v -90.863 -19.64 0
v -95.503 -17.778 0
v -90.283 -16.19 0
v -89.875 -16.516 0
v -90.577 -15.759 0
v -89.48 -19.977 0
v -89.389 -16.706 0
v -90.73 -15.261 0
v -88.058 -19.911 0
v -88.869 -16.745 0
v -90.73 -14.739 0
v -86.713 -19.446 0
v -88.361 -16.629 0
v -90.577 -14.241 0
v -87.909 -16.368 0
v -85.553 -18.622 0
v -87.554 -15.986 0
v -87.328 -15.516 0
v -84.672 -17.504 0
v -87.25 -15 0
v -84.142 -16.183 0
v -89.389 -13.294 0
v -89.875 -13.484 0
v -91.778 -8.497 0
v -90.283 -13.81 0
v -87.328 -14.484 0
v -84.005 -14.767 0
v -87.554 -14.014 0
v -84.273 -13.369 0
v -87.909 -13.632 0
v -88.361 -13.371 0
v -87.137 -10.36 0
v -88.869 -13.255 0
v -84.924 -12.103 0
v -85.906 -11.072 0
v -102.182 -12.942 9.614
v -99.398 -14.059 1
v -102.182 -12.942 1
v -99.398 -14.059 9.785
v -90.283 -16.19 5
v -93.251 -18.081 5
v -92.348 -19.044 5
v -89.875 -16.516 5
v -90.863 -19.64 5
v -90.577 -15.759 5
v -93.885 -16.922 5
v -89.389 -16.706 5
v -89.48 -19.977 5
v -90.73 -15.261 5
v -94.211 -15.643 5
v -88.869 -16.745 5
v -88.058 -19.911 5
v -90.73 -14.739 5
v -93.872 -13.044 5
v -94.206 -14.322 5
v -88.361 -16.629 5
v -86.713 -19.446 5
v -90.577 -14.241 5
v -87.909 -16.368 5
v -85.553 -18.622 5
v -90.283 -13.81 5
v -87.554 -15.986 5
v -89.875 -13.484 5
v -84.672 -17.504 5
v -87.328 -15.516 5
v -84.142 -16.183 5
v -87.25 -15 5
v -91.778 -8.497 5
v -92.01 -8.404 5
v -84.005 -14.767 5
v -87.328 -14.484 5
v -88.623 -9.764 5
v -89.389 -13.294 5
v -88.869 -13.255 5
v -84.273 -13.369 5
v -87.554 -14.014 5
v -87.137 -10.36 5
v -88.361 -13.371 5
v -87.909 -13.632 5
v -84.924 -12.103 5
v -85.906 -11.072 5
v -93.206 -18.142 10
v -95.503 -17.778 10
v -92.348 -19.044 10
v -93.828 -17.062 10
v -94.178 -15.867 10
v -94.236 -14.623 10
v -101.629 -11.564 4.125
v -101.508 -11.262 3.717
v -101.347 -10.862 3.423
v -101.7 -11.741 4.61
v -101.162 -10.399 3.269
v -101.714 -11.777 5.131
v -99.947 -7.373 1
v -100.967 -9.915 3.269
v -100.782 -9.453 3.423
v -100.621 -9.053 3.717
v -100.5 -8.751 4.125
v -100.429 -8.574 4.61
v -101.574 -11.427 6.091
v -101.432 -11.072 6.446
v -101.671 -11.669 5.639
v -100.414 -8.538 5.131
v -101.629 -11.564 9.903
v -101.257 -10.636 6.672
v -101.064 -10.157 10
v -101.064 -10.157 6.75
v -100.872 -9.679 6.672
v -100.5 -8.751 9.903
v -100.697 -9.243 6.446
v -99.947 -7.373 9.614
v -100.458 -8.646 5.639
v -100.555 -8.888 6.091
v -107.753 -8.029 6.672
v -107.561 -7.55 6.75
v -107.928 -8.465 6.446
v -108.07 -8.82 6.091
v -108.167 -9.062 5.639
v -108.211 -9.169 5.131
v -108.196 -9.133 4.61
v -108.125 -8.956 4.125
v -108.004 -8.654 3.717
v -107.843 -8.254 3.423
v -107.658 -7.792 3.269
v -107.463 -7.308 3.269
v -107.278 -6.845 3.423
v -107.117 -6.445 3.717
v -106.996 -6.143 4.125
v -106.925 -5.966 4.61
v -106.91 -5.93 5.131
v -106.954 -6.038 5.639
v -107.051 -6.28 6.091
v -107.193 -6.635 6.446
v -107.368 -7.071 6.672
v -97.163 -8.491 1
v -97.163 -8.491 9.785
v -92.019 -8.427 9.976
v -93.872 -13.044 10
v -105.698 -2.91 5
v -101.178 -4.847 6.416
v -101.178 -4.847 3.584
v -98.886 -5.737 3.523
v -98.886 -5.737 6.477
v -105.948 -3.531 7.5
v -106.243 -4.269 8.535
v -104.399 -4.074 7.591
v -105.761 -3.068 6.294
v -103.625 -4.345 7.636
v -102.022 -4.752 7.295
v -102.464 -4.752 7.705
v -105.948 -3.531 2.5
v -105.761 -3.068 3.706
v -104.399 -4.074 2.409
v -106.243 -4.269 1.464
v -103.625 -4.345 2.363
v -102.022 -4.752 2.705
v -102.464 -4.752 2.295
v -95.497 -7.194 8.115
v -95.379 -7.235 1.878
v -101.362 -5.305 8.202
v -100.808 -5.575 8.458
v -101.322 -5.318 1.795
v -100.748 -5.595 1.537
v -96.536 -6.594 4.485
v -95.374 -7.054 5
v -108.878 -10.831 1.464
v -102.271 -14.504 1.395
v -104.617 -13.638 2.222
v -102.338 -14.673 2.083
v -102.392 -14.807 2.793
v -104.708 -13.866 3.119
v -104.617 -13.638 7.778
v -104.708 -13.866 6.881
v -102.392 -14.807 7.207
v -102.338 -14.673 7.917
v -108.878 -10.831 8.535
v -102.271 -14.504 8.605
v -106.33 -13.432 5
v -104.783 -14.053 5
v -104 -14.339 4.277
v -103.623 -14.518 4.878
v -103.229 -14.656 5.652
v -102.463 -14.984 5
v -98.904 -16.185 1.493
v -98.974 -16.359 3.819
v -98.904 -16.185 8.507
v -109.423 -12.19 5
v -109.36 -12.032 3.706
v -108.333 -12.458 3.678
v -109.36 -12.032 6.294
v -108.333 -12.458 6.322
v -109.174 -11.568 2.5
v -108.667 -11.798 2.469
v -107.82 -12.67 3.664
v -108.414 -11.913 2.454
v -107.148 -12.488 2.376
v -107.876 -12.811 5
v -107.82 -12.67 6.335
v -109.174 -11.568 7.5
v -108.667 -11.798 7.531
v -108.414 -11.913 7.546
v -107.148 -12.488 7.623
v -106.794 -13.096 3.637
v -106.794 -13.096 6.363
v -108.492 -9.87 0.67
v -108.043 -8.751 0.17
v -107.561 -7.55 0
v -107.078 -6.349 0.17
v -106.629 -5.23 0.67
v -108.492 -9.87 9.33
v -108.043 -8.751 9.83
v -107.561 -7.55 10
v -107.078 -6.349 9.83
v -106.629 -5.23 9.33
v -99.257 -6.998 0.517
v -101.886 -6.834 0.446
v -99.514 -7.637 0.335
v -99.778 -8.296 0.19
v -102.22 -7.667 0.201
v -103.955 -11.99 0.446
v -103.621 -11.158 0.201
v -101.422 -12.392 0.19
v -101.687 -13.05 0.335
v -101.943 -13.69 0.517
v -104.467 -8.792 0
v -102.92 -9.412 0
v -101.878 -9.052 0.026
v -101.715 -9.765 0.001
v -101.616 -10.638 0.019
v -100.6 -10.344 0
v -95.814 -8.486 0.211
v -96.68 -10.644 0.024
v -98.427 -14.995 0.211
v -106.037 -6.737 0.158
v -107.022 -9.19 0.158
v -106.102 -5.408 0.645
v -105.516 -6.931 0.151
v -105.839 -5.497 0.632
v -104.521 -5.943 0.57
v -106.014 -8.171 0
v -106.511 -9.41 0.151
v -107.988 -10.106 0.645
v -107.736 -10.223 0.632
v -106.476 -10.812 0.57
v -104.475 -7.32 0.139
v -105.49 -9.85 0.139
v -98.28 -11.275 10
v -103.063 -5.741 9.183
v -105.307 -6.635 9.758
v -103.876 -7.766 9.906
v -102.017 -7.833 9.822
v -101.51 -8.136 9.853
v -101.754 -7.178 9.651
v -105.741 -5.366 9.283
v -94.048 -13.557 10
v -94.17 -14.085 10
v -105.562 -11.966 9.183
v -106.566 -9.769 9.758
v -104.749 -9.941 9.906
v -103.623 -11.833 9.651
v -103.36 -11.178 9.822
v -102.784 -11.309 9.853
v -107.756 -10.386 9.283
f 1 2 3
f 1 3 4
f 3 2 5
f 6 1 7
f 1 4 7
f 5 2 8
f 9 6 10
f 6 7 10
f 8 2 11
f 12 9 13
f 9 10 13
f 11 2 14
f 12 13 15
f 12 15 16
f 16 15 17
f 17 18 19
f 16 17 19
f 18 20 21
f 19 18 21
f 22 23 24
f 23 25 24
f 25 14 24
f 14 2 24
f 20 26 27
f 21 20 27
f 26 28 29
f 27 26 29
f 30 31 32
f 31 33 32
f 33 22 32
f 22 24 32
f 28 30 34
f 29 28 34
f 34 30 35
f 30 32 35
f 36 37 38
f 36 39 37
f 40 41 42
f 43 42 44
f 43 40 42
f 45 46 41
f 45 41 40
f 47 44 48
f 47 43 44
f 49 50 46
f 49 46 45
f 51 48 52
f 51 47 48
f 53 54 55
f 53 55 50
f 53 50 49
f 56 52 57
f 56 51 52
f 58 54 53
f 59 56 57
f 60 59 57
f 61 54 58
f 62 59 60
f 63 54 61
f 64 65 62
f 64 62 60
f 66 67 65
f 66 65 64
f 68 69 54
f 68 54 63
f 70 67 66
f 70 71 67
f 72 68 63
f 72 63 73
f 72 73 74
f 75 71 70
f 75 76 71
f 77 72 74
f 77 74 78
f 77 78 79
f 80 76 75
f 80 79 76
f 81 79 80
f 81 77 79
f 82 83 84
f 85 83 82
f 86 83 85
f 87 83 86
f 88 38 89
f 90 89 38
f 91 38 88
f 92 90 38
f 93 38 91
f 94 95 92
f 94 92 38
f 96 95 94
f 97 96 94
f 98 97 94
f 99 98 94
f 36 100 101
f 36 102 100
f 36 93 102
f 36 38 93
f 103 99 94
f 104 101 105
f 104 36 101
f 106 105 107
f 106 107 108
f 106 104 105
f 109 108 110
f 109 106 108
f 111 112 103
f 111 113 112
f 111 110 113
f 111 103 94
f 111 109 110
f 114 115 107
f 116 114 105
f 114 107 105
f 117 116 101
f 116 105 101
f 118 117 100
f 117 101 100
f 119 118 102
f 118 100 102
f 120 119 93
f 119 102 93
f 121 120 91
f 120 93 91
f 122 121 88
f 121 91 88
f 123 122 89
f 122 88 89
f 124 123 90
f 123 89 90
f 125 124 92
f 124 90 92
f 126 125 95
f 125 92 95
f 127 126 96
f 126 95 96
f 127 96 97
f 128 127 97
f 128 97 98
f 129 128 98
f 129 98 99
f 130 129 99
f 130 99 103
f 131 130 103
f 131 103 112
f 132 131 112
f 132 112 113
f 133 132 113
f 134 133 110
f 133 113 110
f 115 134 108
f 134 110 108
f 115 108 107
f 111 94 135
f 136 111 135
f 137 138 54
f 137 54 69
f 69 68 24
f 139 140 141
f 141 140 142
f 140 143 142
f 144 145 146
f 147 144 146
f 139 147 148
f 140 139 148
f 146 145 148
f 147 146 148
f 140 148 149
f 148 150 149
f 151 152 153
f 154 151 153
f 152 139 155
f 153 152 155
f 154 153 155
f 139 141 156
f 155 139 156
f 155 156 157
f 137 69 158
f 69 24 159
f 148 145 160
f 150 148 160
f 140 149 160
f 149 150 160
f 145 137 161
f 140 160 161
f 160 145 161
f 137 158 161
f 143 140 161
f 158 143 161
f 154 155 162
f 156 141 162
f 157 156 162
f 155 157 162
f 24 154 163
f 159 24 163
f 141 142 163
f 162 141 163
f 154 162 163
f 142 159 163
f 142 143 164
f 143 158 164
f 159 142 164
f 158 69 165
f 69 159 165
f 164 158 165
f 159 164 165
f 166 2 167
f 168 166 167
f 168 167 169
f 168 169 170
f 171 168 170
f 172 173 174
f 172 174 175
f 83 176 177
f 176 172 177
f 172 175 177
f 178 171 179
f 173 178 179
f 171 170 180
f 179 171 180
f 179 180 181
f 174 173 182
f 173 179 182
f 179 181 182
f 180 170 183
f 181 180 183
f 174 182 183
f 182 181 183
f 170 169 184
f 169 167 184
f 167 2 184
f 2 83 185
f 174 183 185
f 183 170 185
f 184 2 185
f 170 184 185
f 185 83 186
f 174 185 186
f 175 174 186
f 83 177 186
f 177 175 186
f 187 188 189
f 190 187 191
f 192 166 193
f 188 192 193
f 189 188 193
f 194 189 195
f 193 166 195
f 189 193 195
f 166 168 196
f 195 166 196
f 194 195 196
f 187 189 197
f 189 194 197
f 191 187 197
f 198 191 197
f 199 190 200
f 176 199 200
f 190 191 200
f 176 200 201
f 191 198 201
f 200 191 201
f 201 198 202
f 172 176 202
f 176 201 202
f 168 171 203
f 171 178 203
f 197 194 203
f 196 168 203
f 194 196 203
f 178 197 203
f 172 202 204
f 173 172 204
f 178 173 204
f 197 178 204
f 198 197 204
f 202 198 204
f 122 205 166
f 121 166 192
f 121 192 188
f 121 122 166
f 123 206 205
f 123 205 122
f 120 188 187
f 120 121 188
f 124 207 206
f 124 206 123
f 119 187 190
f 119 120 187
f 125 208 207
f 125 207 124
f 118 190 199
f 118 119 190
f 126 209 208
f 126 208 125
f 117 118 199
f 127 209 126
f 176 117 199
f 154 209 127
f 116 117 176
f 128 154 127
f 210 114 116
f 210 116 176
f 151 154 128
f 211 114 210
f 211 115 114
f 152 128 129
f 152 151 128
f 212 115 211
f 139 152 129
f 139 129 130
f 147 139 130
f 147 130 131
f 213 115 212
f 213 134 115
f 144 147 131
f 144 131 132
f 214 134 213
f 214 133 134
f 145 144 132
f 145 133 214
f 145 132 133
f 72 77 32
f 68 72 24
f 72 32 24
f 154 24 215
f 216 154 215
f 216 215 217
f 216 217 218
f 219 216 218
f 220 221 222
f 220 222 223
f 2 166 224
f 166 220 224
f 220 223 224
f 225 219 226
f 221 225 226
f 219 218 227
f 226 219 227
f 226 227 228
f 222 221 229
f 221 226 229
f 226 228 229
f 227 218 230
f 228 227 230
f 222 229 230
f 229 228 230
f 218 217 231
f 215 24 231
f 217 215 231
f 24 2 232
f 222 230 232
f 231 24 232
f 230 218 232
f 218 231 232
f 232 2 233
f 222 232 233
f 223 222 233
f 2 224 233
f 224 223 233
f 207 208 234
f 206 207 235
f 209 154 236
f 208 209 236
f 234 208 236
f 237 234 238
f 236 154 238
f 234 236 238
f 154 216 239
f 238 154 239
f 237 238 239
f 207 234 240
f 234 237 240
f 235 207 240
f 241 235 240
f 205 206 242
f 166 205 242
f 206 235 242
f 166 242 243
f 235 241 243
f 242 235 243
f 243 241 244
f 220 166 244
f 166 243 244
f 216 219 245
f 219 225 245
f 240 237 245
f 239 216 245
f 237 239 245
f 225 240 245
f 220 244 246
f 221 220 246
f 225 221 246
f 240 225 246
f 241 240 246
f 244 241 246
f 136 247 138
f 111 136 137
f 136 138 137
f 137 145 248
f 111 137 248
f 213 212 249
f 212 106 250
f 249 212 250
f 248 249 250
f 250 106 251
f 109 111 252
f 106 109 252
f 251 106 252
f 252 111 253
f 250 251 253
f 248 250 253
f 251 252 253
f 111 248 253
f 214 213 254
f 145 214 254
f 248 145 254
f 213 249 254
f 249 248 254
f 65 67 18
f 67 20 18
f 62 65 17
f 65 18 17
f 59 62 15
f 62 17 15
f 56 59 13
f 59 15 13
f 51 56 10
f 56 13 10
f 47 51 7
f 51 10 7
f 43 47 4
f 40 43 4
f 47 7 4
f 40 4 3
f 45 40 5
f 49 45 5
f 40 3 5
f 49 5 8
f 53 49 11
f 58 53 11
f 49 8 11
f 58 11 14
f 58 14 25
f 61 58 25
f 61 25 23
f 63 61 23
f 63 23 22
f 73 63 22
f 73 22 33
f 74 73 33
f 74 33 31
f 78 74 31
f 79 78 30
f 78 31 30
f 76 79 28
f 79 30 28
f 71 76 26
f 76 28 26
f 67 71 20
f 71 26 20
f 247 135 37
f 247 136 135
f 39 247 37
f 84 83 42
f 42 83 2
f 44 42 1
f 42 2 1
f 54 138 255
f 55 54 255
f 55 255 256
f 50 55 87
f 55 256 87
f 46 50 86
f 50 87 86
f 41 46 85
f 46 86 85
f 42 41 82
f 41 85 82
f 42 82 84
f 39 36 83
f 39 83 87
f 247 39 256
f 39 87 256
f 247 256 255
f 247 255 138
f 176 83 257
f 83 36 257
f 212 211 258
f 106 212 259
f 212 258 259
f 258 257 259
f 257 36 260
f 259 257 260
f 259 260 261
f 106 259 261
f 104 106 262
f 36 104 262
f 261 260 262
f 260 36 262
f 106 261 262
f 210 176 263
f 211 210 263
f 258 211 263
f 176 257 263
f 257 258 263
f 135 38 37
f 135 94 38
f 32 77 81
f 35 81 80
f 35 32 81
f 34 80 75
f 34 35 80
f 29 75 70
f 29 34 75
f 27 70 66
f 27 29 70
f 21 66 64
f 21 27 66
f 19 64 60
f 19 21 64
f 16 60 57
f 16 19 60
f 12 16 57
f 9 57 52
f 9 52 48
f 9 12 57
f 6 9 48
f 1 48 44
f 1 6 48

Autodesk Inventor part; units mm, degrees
ref_plane "YZ Plane" through (0, 0, 0) normal (1, 0, 0) x (0, 1, 0)
ref_plane "XZ Plane" through (0, 0, 0) normal (0, 1, 0) x (-1, 0, 0)
ref_plane "XY Plane" through (0, 0, 0) normal (0, 0, 1) x (1, 0, 0)
ref_plane "Work Plane1" through (0, 0, 0) normal (0, 0, 1) x (1, 0, 0)
sketch "Sketch1" plane through (0, 0, 0) normal (0, 0, 1) x (1, 0, 0)
  circle A0 centre (-15, -15) radius 1.2
  circle A1 centre (-89, -15) radius 1.2
  circle A2 centre (-89, -15) radius 1.75
  line L0 (-89, -15) -> (-112.137643, -5.443064) construction
  line L1 (-87.137402, -10.359731) -> (-91.777544, -8.497184)
  line L2 (-95.50274, -17.777722) -> (-90.862598, -19.640269)
  arc A3 (-90.862598, -19.640269) -> (-87.137402, -10.359731) centre (-89, -15) ccw
  line L3 (-95.50274, -17.777722) -> (-91.777544, -8.497184)
  point P0 (-100.568822, -10.221532)
  dimension "d1" = 3.5
  dimension "d10" = 5
extrude "Extrusion1" add sketch "Sketch1" along normal blind 10 contours A3 L2 L3 L1
ref_plane "Work Plane2" through (-109.423166, -12.19008, 0) normal (-0.9280284, 0.3725094, 0) x (0, 0, 1)
sketch "Sketch3" plane through (-109.423166, -12.19008, 0) normal (-0.9280284, 0.3725094, 0) x (0, 0, 1)
  line L0 (0, 10.000274) -> (0, 0)
  line L1 (0, 0) -> (10, 0)
  line L2 (10, 10.000274) -> (10, 0)
  line L3 (0, 10.000274) -> (10, 10.000274)
  circle A0 centre (4.999863, 5.000137) radius 5.000137
  point P0 (0, 52.073903)
sketch "Sketch3 outline for Loft1" plane through (-109.423166, -12.19008, 0) normal (-0.9280284, 0.3725094, 0) x (0, 0, 1)
  circle A0 centre (4.999863, 5.000137) radius 5.000137
loft "Loft1" add profiles "Sketch3 outline for Loft1" section 2 edges at (-93.640142, -13.137453, 0) (-95.50274, -17.777722, 5) (-93.640142, -13.137453, 10) (-91.777544, -8.497184, 5)
sketch "Sketch5" plane through (0, 0, 10) normal (0, 0, 1) x (1, 0, 0)
  circle A0 centre (-89, -15) radius 5.25
  arc A1 (-90.862598, -19.640269) -> (-87.137402, -10.359731) centre (-89, -15) ccw
  point P0 (0, 0)
  dimension "d18" = 10.5
extrude "Extrusion3" cut sketch "Sketch5" against normal blind 5
sketch "Sketch6" plane through (0, 0, 10) normal (0, 0, 1) x (1, 0, 0)
  line L0 (-99.397863, -14.059118) -> (-102.181949, -12.94159)
  line L1 (-102.181949, -12.94159) -> (-99.946892, -7.373419)
  line L2 (-99.946892, -7.373419) -> (-97.162807, -8.490948)
  line L3 (-97.162807, -8.490948) -> (-99.397863, -14.059118)
  line L4 (-116.544319, -29.930925) -> (-85.605283, 47.147132)
  line L5 (-95.50274, -17.777722) -> (-92.347771, -19.044123)
  point P0 (0, 0)
  dimension "d21" = 7
  dimension "d22" = 3
  dimension "d23" = 6
  dimension "d24" = 2
extrude "Extrusion4" cut sketch "Sketch6" against normal blind 9
sketch "Sketch7" plane through (-107.560568, -7.549811, 4.999863) normal (-0.9280284, 0.3725094, 0) x (0, 0, 1)
  arc A0 (-3.535582, -3.535679) -> (3.535582, -3.535679) centre (0, 0) ccw
  point P0 (-4.999863, 47.073766)
hole "Hole1" at (-107.560568, -7.549811, 4.999863) direction (0.9280284, -0.3725094, 0) diameter 3.5 depth 7
sketch "Sketch8" plane through (0, 0, 10) normal (0, 0, 1) x (1, 0, 0)
  line L0 (-88.622575, -9.763584) -> (-91.777544, -8.497184)
  arc A0 (-88.622575, -9.763584) -> (-93.043836, -11.651883) centre (-89, -15) ccw
  spline S0 degree 2 poles (-93.872149, -13.044325) (-93.566724, -12.283424) (-93.043836, -11.651883) knots 0 0 0 1 1 1 weights 1 0.98802352 1
  line L1 (-93.872149, -13.044325) -> (-92.009551, -8.404056)
  arc A1 (-88.622575, -9.763584) -> (-92.347771, -19.044123) centre (-89, -15) ccw
  line L2 (-92.009551, -8.404056) -> (-88.622575, -9.763584)
  point P0 (0, 0)
extrude "Extrusion5" cut sketch "Sketch8" against normal blind 5
properties part number "Hangar"
